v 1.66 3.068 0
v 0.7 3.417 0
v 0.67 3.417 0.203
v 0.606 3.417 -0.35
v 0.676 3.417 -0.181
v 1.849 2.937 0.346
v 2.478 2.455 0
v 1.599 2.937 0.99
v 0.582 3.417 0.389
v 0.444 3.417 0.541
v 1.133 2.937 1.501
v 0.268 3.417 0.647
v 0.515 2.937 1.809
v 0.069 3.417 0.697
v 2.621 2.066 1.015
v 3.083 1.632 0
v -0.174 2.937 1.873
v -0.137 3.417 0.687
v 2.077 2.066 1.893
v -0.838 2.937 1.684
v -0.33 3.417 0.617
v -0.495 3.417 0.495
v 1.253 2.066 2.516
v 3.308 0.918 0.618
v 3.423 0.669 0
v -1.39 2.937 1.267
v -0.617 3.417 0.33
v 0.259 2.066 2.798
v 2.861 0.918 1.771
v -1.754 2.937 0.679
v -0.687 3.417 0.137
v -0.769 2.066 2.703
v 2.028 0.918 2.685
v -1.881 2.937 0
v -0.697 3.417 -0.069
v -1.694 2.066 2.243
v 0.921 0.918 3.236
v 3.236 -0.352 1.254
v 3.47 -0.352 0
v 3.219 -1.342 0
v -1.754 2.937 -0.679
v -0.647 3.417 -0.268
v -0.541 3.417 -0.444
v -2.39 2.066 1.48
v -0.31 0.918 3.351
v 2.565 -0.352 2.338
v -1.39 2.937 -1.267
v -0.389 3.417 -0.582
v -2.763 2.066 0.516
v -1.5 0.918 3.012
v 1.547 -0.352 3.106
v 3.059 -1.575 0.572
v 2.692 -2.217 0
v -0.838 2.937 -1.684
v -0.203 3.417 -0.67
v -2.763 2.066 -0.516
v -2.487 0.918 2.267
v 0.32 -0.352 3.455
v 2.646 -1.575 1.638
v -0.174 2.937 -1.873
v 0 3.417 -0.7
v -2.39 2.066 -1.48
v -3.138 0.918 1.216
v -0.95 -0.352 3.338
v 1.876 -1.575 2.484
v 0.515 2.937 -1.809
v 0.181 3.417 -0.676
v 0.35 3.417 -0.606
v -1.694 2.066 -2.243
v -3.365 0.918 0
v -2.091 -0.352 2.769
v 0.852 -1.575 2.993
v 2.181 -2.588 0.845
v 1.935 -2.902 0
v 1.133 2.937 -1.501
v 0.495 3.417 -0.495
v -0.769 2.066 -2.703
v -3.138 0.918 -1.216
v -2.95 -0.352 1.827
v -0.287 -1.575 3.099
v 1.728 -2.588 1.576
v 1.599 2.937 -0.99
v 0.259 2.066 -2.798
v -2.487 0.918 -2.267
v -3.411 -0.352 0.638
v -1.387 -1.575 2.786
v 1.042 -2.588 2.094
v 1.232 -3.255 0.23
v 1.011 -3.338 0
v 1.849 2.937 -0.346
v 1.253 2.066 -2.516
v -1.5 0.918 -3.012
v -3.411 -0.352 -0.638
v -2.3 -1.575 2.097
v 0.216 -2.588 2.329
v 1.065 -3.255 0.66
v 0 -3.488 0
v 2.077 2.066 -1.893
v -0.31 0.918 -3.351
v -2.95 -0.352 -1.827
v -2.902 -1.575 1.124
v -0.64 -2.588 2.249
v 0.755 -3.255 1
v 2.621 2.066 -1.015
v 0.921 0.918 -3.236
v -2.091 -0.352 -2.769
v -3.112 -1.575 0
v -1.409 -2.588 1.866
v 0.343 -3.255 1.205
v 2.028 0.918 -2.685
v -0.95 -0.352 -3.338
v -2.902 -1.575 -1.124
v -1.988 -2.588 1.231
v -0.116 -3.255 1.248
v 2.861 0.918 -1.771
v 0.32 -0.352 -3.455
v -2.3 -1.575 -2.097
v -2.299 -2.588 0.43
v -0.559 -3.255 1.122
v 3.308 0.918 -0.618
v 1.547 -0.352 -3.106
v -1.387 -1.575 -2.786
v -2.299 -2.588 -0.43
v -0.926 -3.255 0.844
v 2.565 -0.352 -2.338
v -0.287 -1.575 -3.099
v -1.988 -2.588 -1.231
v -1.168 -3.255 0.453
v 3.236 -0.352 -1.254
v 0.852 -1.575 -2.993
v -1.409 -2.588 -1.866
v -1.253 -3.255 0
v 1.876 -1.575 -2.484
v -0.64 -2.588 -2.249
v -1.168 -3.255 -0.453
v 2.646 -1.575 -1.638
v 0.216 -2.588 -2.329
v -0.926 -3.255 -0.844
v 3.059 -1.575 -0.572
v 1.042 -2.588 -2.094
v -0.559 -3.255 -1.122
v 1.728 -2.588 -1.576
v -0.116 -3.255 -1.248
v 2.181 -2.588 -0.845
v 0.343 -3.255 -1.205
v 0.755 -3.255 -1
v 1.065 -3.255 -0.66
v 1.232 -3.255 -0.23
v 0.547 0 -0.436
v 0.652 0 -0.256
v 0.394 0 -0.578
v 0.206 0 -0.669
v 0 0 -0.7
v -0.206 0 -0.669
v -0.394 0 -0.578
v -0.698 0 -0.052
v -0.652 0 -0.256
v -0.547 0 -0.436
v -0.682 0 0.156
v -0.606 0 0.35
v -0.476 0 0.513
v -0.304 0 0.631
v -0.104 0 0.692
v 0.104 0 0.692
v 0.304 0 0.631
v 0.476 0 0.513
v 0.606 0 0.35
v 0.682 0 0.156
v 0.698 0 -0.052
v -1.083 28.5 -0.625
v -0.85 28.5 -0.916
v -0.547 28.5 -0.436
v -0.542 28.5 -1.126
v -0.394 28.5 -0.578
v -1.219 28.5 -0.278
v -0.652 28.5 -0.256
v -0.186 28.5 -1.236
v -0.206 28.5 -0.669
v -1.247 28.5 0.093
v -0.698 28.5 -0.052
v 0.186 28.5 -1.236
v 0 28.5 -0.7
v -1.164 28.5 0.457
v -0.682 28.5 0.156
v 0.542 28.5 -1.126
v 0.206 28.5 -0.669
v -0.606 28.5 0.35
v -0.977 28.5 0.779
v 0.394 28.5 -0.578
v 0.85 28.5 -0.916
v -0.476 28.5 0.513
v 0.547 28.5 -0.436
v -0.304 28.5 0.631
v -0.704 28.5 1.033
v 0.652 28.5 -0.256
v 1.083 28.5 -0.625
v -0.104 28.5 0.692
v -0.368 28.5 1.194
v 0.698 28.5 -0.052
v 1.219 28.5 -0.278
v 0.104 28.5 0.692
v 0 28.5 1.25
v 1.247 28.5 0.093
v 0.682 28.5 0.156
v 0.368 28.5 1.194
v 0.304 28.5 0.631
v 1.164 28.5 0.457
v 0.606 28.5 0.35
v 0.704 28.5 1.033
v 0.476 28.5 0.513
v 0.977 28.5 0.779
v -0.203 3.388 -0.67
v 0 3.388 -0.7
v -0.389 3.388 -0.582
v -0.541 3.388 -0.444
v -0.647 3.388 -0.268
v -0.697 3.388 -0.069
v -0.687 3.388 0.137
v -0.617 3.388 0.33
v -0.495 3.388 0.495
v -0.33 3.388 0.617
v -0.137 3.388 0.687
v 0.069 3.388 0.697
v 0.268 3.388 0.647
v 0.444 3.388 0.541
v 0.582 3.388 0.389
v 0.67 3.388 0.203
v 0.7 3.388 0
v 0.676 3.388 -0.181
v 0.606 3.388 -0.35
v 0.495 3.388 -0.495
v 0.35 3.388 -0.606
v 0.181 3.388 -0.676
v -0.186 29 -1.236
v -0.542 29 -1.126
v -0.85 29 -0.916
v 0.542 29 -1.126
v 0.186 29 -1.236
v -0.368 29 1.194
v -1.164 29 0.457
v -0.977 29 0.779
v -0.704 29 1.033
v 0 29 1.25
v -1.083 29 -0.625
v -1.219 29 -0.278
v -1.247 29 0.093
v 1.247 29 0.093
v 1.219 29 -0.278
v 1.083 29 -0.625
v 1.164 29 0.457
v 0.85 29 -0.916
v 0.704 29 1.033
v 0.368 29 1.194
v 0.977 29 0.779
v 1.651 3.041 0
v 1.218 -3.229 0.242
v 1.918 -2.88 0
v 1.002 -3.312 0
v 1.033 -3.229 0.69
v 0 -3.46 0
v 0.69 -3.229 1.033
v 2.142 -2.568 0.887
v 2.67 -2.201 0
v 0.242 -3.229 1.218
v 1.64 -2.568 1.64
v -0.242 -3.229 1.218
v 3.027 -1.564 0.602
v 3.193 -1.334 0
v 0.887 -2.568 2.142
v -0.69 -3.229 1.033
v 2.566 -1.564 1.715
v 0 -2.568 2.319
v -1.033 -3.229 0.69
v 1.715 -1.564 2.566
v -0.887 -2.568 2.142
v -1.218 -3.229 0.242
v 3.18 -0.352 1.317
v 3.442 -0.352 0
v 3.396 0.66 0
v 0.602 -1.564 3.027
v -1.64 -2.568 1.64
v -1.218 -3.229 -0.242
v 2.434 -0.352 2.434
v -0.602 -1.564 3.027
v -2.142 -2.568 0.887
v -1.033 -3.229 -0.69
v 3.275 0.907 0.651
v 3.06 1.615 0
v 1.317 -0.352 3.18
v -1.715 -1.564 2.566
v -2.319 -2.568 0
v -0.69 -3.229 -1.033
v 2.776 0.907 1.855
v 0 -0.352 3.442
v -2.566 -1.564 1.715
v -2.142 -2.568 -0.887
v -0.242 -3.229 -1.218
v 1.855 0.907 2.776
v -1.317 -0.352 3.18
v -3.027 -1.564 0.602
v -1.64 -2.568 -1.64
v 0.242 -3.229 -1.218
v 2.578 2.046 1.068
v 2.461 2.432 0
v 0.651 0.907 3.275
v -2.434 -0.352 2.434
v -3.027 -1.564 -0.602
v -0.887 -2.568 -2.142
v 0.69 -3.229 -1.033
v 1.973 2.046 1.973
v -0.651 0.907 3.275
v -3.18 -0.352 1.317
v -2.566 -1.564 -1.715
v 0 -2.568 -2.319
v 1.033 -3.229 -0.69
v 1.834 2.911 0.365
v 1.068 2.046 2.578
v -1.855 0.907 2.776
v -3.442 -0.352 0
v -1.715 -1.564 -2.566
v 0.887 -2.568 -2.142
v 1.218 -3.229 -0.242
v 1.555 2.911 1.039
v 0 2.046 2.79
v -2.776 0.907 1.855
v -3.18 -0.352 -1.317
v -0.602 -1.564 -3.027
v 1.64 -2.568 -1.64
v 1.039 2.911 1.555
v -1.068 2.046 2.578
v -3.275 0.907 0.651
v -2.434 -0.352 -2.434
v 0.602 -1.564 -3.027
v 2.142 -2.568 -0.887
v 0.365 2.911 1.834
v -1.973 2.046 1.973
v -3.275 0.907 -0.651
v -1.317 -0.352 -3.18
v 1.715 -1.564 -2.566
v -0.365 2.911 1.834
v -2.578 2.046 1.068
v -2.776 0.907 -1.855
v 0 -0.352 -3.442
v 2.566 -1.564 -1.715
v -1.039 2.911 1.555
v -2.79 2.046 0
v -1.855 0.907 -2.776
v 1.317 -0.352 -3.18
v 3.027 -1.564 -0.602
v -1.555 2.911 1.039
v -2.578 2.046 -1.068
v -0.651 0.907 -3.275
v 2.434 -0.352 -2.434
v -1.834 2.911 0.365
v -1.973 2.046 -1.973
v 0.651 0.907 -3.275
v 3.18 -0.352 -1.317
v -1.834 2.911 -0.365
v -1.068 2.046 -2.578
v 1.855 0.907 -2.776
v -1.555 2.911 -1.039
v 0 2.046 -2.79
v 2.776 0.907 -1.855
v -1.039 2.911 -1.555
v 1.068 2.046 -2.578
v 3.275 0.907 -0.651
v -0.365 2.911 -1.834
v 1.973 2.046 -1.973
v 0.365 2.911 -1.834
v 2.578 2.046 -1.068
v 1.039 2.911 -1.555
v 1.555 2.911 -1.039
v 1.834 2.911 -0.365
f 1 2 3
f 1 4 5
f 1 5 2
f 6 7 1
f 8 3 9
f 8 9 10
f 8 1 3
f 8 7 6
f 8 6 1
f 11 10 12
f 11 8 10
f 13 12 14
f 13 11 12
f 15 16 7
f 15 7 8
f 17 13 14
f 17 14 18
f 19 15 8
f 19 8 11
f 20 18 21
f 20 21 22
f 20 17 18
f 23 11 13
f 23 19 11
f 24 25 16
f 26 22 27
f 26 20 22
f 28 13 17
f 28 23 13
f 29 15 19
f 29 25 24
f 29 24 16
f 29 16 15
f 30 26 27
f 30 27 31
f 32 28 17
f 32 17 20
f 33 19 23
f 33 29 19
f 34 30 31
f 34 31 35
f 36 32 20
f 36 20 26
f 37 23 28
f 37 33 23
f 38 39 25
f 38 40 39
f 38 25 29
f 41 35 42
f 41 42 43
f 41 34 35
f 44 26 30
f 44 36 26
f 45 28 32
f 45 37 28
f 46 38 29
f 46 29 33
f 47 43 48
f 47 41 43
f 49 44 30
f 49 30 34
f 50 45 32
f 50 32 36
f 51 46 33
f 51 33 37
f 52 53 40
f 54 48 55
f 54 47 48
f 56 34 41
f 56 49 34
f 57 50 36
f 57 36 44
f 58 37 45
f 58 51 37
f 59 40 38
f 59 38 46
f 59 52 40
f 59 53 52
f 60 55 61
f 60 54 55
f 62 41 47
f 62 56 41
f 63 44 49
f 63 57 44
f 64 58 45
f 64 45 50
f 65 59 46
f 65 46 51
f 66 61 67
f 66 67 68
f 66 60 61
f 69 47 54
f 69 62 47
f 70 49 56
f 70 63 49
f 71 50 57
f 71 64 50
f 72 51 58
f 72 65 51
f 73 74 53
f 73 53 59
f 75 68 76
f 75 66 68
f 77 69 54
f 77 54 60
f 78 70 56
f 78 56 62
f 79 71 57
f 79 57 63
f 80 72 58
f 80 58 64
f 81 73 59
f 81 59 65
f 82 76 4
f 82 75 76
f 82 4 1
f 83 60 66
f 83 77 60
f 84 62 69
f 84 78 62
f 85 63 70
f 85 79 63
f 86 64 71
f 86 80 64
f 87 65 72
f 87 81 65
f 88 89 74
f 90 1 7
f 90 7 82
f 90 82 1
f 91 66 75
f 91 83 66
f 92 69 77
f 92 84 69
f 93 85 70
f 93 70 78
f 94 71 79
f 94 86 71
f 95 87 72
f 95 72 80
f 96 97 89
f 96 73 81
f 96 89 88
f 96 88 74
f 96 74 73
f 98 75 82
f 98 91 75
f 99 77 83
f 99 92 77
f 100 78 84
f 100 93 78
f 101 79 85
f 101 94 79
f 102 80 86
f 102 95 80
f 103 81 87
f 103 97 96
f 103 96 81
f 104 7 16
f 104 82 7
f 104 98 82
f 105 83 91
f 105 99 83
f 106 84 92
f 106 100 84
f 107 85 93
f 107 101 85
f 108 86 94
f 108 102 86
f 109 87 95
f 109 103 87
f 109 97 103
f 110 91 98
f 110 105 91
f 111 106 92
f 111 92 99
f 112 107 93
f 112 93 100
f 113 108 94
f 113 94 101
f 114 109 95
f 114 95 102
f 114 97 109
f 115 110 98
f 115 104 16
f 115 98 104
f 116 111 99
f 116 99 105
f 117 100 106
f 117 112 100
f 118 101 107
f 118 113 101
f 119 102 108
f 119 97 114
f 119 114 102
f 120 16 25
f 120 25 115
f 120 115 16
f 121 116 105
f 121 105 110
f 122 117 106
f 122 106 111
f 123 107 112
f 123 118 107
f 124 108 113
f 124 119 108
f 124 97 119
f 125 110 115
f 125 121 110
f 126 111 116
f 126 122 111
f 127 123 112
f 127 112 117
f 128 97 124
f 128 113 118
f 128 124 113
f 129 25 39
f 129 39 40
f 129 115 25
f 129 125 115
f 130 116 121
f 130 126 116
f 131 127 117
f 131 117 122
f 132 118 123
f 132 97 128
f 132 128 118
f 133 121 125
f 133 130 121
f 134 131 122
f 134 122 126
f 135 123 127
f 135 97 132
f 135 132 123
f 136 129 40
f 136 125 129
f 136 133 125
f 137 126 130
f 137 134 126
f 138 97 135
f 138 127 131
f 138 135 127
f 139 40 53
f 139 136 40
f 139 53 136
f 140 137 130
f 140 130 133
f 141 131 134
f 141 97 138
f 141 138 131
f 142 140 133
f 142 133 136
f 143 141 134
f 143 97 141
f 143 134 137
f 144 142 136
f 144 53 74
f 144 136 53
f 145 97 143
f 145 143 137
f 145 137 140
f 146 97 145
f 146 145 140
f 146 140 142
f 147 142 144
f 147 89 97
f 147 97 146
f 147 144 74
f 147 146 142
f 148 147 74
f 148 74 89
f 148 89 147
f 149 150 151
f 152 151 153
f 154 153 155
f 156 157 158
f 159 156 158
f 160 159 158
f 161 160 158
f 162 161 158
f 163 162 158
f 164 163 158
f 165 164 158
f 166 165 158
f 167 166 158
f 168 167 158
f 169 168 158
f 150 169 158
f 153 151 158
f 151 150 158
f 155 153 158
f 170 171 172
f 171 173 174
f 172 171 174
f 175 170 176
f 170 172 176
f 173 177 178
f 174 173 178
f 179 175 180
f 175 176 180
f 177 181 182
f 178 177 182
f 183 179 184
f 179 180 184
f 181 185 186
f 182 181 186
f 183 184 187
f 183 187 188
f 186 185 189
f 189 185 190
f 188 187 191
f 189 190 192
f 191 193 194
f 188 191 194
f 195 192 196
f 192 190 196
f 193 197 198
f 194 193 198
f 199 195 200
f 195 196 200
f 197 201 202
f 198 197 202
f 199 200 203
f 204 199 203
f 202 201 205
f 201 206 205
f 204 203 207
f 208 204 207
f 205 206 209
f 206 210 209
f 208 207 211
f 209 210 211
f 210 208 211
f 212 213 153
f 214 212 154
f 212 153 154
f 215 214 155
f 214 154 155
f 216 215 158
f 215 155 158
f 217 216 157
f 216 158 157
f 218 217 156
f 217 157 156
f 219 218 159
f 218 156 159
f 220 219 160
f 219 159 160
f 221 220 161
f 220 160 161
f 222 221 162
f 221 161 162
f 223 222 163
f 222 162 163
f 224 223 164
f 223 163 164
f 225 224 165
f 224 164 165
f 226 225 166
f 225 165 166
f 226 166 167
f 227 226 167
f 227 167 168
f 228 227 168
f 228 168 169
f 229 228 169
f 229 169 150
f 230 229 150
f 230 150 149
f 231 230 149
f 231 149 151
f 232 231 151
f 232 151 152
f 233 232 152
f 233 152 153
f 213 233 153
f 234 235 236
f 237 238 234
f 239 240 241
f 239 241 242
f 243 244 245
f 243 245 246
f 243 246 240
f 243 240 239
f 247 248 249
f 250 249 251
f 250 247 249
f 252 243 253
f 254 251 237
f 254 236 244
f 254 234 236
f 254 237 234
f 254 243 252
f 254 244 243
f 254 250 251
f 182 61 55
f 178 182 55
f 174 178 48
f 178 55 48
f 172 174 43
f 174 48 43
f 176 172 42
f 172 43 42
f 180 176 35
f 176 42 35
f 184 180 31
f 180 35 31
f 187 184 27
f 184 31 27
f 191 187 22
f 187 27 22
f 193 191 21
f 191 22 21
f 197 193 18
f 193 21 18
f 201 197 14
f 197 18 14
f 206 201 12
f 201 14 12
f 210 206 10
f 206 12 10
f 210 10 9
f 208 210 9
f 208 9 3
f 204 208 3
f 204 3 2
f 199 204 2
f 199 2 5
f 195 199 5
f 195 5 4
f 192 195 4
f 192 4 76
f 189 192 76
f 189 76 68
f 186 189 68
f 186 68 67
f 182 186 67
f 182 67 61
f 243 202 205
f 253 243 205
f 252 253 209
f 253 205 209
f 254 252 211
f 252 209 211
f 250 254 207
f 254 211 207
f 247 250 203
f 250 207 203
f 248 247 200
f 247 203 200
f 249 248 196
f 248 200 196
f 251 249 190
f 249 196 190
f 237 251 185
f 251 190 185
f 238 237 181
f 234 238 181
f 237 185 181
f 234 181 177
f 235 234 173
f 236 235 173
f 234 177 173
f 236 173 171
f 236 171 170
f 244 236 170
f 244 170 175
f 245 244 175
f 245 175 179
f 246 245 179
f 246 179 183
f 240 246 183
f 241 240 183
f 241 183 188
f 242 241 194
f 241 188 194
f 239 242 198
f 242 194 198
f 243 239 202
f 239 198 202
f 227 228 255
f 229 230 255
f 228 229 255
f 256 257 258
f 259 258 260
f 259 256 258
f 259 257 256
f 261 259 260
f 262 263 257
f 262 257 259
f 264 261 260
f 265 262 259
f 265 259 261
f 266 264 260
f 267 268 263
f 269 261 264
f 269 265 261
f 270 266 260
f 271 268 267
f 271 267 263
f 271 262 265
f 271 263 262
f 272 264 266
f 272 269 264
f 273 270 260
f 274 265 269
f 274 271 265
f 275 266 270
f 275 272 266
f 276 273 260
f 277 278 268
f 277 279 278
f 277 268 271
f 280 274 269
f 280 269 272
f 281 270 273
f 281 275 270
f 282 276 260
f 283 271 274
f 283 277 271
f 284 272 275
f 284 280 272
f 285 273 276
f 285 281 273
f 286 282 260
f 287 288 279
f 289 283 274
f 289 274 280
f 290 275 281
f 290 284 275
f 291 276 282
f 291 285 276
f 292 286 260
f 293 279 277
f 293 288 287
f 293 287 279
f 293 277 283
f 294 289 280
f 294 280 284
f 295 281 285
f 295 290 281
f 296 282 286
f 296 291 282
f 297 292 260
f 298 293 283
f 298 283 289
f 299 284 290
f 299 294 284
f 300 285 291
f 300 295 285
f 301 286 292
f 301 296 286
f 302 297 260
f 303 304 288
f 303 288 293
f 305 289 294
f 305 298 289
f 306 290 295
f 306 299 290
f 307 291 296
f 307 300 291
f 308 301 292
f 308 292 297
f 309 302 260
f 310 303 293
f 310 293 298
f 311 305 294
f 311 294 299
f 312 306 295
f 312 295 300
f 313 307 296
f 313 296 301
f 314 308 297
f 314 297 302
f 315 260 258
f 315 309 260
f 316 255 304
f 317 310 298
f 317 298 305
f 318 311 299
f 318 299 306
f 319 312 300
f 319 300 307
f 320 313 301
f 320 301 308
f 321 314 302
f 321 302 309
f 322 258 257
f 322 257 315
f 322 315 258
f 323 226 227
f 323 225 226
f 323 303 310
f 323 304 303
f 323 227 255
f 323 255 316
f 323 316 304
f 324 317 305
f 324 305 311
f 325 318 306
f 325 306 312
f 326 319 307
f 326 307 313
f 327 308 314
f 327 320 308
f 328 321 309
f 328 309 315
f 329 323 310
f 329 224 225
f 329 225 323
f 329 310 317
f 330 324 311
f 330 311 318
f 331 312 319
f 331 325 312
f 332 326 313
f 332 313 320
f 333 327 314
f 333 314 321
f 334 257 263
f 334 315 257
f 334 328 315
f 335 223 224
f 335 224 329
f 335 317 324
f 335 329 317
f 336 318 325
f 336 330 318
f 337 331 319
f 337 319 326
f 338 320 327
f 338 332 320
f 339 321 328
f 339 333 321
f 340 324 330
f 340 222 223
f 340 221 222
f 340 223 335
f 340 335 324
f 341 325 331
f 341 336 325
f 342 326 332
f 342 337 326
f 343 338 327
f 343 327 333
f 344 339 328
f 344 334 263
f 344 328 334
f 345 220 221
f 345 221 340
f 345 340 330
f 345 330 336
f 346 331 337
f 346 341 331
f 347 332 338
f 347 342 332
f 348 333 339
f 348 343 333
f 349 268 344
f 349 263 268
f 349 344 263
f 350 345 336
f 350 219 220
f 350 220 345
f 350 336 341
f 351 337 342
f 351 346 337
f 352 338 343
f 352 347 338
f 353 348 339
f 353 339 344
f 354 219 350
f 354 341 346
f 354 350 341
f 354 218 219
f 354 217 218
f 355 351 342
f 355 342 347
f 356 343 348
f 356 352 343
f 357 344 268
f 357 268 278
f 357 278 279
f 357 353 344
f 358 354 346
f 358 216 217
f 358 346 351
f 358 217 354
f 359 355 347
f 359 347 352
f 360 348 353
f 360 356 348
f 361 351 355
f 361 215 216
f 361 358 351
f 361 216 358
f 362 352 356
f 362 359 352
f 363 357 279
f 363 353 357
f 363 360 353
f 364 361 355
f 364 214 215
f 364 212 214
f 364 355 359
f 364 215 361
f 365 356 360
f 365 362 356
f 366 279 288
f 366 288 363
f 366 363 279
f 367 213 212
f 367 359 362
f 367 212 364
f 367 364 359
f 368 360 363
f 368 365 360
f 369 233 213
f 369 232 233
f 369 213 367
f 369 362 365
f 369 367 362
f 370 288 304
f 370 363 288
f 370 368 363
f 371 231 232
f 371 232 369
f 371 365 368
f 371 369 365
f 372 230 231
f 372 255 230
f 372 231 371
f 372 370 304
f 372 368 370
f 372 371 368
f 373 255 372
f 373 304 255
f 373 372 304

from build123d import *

# Parameters (mm, degrees)
SKETCH3_R           = 0.7
BOSS_EXTRUDE1_DEPTH = 28.5
SKETCH4_R           = 1.25
BOSS_EXTRUDE3_DEPTH = 0.5


with BuildPart() as part:
    # Sketch1 → Revolve-Thin1 (revolve)
    with BuildSketch(Plane.XY):
        with BuildLine():
            ThreePointArc((0, -3.46), (3.46, 0), (0, 3.46))
            Line((0, 3.46), (0, 3.488))
            ThreePointArc((0, 3.488), (3.488, 0), (0, -3.488))
            Line((0, -3.488), (0, -3.46))
        make_face()
    revolve(axis=Axis((0, 3.46, 0), (0, -1, 0)))

    # Sketch3 → Boss-Extrude1 (add)
    with BuildSketch(Plane(origin=(0, 0, 0), x_dir=(1, 0, 0), z_dir=(0, 1, 0))):
        with Locations(Location((0, 0, 0), (0, 0, 90))):
            Circle(SKETCH3_R)
    extrude(amount=BOSS_EXTRUDE1_DEPTH)

    # Sketch4 → Boss-Extrude3 (add)
    with BuildSketch(Plane(origin=(0, 28.5, 0), x_dir=(1, 0, 0), z_dir=(0, 1, 0))):
        with Locations(Location((0, 0, 0), (0, 0, 270))):
            Circle(SKETCH4_R)
    extrude(amount=BOSS_EXTRUDE3_DEPTH)


solid = part.part
